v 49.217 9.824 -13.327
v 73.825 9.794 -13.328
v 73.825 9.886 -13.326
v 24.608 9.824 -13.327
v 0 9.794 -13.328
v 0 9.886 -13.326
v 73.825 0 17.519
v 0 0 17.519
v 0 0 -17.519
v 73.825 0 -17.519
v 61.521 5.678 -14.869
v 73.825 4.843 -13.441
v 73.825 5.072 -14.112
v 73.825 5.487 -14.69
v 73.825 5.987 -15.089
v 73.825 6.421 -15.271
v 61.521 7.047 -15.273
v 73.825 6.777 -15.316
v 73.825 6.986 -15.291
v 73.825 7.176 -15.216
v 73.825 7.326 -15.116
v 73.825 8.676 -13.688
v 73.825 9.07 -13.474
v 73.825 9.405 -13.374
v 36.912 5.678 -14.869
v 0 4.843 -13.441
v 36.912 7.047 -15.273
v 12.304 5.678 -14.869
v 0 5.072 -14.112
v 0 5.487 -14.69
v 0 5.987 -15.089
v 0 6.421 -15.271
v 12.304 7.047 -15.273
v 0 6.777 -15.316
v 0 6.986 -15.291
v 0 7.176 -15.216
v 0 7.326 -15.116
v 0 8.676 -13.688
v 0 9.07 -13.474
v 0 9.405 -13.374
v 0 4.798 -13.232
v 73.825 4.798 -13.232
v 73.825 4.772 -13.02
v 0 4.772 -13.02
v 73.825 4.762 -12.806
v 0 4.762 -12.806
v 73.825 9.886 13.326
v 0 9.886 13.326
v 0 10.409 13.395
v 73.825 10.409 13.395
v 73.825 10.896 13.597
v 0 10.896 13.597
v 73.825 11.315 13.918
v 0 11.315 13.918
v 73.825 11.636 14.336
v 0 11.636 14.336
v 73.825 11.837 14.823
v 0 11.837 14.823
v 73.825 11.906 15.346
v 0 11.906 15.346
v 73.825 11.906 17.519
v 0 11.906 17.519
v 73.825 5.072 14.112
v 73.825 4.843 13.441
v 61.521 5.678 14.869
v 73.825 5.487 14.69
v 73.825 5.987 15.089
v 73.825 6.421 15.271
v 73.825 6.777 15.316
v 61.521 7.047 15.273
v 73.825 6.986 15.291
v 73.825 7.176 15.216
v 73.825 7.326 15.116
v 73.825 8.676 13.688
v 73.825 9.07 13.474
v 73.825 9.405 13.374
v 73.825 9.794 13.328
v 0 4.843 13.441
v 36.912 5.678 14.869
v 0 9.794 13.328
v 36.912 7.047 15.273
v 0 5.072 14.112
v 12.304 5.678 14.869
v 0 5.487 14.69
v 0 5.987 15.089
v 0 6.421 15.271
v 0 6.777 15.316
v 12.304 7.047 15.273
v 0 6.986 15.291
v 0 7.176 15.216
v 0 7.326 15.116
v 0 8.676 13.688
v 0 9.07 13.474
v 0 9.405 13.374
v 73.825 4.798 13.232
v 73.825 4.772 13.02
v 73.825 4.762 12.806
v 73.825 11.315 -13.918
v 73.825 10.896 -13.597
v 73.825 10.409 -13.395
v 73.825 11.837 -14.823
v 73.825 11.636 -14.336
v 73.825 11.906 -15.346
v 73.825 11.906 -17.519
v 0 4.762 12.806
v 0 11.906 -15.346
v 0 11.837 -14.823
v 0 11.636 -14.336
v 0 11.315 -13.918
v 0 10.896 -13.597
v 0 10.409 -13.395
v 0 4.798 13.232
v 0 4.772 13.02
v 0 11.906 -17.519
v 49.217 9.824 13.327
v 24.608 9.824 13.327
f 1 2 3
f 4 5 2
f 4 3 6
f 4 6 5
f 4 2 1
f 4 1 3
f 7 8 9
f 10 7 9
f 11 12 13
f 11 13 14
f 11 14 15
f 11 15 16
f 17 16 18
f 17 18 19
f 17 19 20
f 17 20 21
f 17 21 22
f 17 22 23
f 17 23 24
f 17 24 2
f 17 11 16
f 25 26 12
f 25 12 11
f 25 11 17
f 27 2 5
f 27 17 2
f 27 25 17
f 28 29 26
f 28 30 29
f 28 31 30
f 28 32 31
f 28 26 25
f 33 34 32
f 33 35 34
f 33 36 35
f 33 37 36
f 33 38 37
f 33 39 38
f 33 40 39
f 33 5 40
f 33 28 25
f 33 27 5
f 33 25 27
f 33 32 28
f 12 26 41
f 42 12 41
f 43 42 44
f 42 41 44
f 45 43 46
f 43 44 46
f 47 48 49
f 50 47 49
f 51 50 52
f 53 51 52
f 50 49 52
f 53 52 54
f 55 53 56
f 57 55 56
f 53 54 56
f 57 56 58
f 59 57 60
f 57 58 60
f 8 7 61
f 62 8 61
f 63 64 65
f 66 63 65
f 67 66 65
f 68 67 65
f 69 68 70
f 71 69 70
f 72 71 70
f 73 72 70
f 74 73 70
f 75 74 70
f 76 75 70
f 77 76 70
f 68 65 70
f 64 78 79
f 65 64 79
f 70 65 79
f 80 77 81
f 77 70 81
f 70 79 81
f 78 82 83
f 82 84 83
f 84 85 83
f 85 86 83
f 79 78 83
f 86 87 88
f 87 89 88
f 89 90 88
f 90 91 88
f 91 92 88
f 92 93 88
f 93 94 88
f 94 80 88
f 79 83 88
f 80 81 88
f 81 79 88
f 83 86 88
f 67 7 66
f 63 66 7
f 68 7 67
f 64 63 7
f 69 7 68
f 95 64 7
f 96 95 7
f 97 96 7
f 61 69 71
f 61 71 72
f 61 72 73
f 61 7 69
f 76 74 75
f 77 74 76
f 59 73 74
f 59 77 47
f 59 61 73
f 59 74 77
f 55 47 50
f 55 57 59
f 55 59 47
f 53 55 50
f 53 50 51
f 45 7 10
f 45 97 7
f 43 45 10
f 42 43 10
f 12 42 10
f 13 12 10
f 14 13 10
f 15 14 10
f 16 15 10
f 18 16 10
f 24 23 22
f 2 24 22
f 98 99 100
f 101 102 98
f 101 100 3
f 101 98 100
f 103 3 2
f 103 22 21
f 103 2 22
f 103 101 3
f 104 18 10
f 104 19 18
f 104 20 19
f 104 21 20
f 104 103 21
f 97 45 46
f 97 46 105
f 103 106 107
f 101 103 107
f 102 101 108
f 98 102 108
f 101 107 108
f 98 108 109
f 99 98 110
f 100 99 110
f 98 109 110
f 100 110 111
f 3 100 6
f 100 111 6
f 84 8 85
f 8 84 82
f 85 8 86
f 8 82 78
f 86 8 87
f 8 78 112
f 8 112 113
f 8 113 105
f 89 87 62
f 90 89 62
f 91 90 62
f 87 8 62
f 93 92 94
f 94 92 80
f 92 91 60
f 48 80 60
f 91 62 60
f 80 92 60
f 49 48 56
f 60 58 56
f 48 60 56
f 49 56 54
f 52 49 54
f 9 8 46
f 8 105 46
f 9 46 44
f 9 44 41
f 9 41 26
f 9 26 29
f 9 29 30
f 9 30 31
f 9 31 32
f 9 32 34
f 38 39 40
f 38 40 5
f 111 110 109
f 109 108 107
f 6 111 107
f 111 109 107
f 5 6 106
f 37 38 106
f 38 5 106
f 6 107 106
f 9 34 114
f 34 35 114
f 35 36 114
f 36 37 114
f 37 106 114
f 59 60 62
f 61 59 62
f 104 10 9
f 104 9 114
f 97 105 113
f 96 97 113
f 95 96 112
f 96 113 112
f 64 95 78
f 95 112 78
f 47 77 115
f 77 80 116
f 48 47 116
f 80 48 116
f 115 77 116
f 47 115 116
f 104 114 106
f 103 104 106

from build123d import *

# Parameters (mm, degrees)
BOSS_EXTRUDE1_DEPTH = 73.824999924
SKETCH2_W           = 5.5
SKETCH2_H           = 11.90625
CUT_EXTRUDE1_DEPTH  = 77


with BuildPart() as part:
    # Sketch1 → Boss-Extrude1 (new body)
    with BuildSketch(Plane(origin=(0, 0, 0), x_dir=(0, 0, -1), z_dir=(1, 0, 0))):
        with BuildLine():
            Line((-16.615833333, 11.90625), (-23.01875, 11.90625))
            Line((-23.01875, 11.90625), (-23.01875, 0))
            Line((-23.01875, 0), (23.01875, 0))
            Line((23.01875, 0), (23.01875, 11.90625))
            Line((23.01875, 11.90625), (16.615833333, 11.90625))
            Line((16.615833333, 11.90625), (15.345833333, 11.90625))
            ThreePointArc((15.345833333, 11.90625), (13.917616741, 11.314663318), (13.326030059, 9.886446726))
            add(Edge.make_bspline(
                [(13.328163425, 9.793638273), (13.326964681, 9.82406182), (13.32624931, 9.854992294), (13.326030059, 9.886446726)],
                knots=[0.989153926, 0.989153926, 0.989153926, 0.989153926, 1, 1, 1, 1], degree=3))
            add(Edge.make_bspline(
                [(13.44097879, 4.843193137), (13.756839485, 4.900565232), (14.289482388, 5.115085376), (14.924667677, 5.682716987), (15.305824568, 6.321722829), (15.357243262, 7.163342963), (14.243691121, 8.123322783), (13.37079951, 8.71155514), (13.328163425, 9.793638273)],
                knots=[0.001929893, 0.001929893, 0.001929893, 0.001929893, 0.146224432, 0.253988964, 0.379668219, 0.474367728, 0.603388454, 0.989153926, 0.989153926, 0.989153926, 0.989153926], degree=3))
            ThreePointArc((13.44097879, 4.843193137), (13.125958752, 4.782754037), (12.805833333, 4.7625))
            Line((12.805833333, 4.7625), (-12.805833333, 4.7625))
            ThreePointArc((-12.805833333, 4.7625), (-13.125958752, 4.782754037), (-13.44097879, 4.843193137))
            add(Edge.make_bspline(
                [(-13.44097879, 4.843193137), (-13.756839485, 4.900565232), (-14.289482388, 5.115085376), (-14.924667677, 5.682716987), (-15.305824568, 6.321722829), (-15.357243262, 7.163342963), (-14.243691121, 8.123322783), (-13.37079951, 8.71155514), (-13.328163425, 9.793638273)],
                knots=[0.001929893, 0.001929893, 0.001929893, 0.001929893, 0.146224432, 0.253988964, 0.379668219, 0.474367728, 0.603388454, 0.989153926, 0.989153926, 0.989153926, 0.989153926], degree=3))
            add(Edge.make_bspline(
                [(-13.328163425, 9.793638273), (-13.326964681, 9.82406182), (-13.32624931, 9.854992294), (-13.326030059, 9.886446726)],
                knots=[0.989153926, 0.989153926, 0.989153926, 0.989153926, 1, 1, 1, 1], degree=3))
            ThreePointArc((-13.326030059, 9.886446726), (-13.917616741, 11.314663318), (-15.345833333, 11.90625))
            Line((-15.345833333, 11.90625), (-16.615833333, 11.90625))
        make_face()
    extrude(amount=BOSS_EXTRUDE1_DEPTH)

    # Sketch2 → Cut-Extrude1 (cut)
    with BuildSketch(Plane(origin=(73.824999924, 0, 0), x_dir=(0, 0, -1), z_dir=(1, 0, 0))):
        with Locations((-20.26875, 5.953125)):
            Rectangle(SKETCH2_W, SKETCH2_H)
        with Locations((20.26875, 5.953125)):
            Rectangle(SKETCH2_W, SKETCH2_H)
    extrude(amount=-CUT_EXTRUDE1_DEPTH, mode=Mode.SUBTRACT)


solid = part.part
